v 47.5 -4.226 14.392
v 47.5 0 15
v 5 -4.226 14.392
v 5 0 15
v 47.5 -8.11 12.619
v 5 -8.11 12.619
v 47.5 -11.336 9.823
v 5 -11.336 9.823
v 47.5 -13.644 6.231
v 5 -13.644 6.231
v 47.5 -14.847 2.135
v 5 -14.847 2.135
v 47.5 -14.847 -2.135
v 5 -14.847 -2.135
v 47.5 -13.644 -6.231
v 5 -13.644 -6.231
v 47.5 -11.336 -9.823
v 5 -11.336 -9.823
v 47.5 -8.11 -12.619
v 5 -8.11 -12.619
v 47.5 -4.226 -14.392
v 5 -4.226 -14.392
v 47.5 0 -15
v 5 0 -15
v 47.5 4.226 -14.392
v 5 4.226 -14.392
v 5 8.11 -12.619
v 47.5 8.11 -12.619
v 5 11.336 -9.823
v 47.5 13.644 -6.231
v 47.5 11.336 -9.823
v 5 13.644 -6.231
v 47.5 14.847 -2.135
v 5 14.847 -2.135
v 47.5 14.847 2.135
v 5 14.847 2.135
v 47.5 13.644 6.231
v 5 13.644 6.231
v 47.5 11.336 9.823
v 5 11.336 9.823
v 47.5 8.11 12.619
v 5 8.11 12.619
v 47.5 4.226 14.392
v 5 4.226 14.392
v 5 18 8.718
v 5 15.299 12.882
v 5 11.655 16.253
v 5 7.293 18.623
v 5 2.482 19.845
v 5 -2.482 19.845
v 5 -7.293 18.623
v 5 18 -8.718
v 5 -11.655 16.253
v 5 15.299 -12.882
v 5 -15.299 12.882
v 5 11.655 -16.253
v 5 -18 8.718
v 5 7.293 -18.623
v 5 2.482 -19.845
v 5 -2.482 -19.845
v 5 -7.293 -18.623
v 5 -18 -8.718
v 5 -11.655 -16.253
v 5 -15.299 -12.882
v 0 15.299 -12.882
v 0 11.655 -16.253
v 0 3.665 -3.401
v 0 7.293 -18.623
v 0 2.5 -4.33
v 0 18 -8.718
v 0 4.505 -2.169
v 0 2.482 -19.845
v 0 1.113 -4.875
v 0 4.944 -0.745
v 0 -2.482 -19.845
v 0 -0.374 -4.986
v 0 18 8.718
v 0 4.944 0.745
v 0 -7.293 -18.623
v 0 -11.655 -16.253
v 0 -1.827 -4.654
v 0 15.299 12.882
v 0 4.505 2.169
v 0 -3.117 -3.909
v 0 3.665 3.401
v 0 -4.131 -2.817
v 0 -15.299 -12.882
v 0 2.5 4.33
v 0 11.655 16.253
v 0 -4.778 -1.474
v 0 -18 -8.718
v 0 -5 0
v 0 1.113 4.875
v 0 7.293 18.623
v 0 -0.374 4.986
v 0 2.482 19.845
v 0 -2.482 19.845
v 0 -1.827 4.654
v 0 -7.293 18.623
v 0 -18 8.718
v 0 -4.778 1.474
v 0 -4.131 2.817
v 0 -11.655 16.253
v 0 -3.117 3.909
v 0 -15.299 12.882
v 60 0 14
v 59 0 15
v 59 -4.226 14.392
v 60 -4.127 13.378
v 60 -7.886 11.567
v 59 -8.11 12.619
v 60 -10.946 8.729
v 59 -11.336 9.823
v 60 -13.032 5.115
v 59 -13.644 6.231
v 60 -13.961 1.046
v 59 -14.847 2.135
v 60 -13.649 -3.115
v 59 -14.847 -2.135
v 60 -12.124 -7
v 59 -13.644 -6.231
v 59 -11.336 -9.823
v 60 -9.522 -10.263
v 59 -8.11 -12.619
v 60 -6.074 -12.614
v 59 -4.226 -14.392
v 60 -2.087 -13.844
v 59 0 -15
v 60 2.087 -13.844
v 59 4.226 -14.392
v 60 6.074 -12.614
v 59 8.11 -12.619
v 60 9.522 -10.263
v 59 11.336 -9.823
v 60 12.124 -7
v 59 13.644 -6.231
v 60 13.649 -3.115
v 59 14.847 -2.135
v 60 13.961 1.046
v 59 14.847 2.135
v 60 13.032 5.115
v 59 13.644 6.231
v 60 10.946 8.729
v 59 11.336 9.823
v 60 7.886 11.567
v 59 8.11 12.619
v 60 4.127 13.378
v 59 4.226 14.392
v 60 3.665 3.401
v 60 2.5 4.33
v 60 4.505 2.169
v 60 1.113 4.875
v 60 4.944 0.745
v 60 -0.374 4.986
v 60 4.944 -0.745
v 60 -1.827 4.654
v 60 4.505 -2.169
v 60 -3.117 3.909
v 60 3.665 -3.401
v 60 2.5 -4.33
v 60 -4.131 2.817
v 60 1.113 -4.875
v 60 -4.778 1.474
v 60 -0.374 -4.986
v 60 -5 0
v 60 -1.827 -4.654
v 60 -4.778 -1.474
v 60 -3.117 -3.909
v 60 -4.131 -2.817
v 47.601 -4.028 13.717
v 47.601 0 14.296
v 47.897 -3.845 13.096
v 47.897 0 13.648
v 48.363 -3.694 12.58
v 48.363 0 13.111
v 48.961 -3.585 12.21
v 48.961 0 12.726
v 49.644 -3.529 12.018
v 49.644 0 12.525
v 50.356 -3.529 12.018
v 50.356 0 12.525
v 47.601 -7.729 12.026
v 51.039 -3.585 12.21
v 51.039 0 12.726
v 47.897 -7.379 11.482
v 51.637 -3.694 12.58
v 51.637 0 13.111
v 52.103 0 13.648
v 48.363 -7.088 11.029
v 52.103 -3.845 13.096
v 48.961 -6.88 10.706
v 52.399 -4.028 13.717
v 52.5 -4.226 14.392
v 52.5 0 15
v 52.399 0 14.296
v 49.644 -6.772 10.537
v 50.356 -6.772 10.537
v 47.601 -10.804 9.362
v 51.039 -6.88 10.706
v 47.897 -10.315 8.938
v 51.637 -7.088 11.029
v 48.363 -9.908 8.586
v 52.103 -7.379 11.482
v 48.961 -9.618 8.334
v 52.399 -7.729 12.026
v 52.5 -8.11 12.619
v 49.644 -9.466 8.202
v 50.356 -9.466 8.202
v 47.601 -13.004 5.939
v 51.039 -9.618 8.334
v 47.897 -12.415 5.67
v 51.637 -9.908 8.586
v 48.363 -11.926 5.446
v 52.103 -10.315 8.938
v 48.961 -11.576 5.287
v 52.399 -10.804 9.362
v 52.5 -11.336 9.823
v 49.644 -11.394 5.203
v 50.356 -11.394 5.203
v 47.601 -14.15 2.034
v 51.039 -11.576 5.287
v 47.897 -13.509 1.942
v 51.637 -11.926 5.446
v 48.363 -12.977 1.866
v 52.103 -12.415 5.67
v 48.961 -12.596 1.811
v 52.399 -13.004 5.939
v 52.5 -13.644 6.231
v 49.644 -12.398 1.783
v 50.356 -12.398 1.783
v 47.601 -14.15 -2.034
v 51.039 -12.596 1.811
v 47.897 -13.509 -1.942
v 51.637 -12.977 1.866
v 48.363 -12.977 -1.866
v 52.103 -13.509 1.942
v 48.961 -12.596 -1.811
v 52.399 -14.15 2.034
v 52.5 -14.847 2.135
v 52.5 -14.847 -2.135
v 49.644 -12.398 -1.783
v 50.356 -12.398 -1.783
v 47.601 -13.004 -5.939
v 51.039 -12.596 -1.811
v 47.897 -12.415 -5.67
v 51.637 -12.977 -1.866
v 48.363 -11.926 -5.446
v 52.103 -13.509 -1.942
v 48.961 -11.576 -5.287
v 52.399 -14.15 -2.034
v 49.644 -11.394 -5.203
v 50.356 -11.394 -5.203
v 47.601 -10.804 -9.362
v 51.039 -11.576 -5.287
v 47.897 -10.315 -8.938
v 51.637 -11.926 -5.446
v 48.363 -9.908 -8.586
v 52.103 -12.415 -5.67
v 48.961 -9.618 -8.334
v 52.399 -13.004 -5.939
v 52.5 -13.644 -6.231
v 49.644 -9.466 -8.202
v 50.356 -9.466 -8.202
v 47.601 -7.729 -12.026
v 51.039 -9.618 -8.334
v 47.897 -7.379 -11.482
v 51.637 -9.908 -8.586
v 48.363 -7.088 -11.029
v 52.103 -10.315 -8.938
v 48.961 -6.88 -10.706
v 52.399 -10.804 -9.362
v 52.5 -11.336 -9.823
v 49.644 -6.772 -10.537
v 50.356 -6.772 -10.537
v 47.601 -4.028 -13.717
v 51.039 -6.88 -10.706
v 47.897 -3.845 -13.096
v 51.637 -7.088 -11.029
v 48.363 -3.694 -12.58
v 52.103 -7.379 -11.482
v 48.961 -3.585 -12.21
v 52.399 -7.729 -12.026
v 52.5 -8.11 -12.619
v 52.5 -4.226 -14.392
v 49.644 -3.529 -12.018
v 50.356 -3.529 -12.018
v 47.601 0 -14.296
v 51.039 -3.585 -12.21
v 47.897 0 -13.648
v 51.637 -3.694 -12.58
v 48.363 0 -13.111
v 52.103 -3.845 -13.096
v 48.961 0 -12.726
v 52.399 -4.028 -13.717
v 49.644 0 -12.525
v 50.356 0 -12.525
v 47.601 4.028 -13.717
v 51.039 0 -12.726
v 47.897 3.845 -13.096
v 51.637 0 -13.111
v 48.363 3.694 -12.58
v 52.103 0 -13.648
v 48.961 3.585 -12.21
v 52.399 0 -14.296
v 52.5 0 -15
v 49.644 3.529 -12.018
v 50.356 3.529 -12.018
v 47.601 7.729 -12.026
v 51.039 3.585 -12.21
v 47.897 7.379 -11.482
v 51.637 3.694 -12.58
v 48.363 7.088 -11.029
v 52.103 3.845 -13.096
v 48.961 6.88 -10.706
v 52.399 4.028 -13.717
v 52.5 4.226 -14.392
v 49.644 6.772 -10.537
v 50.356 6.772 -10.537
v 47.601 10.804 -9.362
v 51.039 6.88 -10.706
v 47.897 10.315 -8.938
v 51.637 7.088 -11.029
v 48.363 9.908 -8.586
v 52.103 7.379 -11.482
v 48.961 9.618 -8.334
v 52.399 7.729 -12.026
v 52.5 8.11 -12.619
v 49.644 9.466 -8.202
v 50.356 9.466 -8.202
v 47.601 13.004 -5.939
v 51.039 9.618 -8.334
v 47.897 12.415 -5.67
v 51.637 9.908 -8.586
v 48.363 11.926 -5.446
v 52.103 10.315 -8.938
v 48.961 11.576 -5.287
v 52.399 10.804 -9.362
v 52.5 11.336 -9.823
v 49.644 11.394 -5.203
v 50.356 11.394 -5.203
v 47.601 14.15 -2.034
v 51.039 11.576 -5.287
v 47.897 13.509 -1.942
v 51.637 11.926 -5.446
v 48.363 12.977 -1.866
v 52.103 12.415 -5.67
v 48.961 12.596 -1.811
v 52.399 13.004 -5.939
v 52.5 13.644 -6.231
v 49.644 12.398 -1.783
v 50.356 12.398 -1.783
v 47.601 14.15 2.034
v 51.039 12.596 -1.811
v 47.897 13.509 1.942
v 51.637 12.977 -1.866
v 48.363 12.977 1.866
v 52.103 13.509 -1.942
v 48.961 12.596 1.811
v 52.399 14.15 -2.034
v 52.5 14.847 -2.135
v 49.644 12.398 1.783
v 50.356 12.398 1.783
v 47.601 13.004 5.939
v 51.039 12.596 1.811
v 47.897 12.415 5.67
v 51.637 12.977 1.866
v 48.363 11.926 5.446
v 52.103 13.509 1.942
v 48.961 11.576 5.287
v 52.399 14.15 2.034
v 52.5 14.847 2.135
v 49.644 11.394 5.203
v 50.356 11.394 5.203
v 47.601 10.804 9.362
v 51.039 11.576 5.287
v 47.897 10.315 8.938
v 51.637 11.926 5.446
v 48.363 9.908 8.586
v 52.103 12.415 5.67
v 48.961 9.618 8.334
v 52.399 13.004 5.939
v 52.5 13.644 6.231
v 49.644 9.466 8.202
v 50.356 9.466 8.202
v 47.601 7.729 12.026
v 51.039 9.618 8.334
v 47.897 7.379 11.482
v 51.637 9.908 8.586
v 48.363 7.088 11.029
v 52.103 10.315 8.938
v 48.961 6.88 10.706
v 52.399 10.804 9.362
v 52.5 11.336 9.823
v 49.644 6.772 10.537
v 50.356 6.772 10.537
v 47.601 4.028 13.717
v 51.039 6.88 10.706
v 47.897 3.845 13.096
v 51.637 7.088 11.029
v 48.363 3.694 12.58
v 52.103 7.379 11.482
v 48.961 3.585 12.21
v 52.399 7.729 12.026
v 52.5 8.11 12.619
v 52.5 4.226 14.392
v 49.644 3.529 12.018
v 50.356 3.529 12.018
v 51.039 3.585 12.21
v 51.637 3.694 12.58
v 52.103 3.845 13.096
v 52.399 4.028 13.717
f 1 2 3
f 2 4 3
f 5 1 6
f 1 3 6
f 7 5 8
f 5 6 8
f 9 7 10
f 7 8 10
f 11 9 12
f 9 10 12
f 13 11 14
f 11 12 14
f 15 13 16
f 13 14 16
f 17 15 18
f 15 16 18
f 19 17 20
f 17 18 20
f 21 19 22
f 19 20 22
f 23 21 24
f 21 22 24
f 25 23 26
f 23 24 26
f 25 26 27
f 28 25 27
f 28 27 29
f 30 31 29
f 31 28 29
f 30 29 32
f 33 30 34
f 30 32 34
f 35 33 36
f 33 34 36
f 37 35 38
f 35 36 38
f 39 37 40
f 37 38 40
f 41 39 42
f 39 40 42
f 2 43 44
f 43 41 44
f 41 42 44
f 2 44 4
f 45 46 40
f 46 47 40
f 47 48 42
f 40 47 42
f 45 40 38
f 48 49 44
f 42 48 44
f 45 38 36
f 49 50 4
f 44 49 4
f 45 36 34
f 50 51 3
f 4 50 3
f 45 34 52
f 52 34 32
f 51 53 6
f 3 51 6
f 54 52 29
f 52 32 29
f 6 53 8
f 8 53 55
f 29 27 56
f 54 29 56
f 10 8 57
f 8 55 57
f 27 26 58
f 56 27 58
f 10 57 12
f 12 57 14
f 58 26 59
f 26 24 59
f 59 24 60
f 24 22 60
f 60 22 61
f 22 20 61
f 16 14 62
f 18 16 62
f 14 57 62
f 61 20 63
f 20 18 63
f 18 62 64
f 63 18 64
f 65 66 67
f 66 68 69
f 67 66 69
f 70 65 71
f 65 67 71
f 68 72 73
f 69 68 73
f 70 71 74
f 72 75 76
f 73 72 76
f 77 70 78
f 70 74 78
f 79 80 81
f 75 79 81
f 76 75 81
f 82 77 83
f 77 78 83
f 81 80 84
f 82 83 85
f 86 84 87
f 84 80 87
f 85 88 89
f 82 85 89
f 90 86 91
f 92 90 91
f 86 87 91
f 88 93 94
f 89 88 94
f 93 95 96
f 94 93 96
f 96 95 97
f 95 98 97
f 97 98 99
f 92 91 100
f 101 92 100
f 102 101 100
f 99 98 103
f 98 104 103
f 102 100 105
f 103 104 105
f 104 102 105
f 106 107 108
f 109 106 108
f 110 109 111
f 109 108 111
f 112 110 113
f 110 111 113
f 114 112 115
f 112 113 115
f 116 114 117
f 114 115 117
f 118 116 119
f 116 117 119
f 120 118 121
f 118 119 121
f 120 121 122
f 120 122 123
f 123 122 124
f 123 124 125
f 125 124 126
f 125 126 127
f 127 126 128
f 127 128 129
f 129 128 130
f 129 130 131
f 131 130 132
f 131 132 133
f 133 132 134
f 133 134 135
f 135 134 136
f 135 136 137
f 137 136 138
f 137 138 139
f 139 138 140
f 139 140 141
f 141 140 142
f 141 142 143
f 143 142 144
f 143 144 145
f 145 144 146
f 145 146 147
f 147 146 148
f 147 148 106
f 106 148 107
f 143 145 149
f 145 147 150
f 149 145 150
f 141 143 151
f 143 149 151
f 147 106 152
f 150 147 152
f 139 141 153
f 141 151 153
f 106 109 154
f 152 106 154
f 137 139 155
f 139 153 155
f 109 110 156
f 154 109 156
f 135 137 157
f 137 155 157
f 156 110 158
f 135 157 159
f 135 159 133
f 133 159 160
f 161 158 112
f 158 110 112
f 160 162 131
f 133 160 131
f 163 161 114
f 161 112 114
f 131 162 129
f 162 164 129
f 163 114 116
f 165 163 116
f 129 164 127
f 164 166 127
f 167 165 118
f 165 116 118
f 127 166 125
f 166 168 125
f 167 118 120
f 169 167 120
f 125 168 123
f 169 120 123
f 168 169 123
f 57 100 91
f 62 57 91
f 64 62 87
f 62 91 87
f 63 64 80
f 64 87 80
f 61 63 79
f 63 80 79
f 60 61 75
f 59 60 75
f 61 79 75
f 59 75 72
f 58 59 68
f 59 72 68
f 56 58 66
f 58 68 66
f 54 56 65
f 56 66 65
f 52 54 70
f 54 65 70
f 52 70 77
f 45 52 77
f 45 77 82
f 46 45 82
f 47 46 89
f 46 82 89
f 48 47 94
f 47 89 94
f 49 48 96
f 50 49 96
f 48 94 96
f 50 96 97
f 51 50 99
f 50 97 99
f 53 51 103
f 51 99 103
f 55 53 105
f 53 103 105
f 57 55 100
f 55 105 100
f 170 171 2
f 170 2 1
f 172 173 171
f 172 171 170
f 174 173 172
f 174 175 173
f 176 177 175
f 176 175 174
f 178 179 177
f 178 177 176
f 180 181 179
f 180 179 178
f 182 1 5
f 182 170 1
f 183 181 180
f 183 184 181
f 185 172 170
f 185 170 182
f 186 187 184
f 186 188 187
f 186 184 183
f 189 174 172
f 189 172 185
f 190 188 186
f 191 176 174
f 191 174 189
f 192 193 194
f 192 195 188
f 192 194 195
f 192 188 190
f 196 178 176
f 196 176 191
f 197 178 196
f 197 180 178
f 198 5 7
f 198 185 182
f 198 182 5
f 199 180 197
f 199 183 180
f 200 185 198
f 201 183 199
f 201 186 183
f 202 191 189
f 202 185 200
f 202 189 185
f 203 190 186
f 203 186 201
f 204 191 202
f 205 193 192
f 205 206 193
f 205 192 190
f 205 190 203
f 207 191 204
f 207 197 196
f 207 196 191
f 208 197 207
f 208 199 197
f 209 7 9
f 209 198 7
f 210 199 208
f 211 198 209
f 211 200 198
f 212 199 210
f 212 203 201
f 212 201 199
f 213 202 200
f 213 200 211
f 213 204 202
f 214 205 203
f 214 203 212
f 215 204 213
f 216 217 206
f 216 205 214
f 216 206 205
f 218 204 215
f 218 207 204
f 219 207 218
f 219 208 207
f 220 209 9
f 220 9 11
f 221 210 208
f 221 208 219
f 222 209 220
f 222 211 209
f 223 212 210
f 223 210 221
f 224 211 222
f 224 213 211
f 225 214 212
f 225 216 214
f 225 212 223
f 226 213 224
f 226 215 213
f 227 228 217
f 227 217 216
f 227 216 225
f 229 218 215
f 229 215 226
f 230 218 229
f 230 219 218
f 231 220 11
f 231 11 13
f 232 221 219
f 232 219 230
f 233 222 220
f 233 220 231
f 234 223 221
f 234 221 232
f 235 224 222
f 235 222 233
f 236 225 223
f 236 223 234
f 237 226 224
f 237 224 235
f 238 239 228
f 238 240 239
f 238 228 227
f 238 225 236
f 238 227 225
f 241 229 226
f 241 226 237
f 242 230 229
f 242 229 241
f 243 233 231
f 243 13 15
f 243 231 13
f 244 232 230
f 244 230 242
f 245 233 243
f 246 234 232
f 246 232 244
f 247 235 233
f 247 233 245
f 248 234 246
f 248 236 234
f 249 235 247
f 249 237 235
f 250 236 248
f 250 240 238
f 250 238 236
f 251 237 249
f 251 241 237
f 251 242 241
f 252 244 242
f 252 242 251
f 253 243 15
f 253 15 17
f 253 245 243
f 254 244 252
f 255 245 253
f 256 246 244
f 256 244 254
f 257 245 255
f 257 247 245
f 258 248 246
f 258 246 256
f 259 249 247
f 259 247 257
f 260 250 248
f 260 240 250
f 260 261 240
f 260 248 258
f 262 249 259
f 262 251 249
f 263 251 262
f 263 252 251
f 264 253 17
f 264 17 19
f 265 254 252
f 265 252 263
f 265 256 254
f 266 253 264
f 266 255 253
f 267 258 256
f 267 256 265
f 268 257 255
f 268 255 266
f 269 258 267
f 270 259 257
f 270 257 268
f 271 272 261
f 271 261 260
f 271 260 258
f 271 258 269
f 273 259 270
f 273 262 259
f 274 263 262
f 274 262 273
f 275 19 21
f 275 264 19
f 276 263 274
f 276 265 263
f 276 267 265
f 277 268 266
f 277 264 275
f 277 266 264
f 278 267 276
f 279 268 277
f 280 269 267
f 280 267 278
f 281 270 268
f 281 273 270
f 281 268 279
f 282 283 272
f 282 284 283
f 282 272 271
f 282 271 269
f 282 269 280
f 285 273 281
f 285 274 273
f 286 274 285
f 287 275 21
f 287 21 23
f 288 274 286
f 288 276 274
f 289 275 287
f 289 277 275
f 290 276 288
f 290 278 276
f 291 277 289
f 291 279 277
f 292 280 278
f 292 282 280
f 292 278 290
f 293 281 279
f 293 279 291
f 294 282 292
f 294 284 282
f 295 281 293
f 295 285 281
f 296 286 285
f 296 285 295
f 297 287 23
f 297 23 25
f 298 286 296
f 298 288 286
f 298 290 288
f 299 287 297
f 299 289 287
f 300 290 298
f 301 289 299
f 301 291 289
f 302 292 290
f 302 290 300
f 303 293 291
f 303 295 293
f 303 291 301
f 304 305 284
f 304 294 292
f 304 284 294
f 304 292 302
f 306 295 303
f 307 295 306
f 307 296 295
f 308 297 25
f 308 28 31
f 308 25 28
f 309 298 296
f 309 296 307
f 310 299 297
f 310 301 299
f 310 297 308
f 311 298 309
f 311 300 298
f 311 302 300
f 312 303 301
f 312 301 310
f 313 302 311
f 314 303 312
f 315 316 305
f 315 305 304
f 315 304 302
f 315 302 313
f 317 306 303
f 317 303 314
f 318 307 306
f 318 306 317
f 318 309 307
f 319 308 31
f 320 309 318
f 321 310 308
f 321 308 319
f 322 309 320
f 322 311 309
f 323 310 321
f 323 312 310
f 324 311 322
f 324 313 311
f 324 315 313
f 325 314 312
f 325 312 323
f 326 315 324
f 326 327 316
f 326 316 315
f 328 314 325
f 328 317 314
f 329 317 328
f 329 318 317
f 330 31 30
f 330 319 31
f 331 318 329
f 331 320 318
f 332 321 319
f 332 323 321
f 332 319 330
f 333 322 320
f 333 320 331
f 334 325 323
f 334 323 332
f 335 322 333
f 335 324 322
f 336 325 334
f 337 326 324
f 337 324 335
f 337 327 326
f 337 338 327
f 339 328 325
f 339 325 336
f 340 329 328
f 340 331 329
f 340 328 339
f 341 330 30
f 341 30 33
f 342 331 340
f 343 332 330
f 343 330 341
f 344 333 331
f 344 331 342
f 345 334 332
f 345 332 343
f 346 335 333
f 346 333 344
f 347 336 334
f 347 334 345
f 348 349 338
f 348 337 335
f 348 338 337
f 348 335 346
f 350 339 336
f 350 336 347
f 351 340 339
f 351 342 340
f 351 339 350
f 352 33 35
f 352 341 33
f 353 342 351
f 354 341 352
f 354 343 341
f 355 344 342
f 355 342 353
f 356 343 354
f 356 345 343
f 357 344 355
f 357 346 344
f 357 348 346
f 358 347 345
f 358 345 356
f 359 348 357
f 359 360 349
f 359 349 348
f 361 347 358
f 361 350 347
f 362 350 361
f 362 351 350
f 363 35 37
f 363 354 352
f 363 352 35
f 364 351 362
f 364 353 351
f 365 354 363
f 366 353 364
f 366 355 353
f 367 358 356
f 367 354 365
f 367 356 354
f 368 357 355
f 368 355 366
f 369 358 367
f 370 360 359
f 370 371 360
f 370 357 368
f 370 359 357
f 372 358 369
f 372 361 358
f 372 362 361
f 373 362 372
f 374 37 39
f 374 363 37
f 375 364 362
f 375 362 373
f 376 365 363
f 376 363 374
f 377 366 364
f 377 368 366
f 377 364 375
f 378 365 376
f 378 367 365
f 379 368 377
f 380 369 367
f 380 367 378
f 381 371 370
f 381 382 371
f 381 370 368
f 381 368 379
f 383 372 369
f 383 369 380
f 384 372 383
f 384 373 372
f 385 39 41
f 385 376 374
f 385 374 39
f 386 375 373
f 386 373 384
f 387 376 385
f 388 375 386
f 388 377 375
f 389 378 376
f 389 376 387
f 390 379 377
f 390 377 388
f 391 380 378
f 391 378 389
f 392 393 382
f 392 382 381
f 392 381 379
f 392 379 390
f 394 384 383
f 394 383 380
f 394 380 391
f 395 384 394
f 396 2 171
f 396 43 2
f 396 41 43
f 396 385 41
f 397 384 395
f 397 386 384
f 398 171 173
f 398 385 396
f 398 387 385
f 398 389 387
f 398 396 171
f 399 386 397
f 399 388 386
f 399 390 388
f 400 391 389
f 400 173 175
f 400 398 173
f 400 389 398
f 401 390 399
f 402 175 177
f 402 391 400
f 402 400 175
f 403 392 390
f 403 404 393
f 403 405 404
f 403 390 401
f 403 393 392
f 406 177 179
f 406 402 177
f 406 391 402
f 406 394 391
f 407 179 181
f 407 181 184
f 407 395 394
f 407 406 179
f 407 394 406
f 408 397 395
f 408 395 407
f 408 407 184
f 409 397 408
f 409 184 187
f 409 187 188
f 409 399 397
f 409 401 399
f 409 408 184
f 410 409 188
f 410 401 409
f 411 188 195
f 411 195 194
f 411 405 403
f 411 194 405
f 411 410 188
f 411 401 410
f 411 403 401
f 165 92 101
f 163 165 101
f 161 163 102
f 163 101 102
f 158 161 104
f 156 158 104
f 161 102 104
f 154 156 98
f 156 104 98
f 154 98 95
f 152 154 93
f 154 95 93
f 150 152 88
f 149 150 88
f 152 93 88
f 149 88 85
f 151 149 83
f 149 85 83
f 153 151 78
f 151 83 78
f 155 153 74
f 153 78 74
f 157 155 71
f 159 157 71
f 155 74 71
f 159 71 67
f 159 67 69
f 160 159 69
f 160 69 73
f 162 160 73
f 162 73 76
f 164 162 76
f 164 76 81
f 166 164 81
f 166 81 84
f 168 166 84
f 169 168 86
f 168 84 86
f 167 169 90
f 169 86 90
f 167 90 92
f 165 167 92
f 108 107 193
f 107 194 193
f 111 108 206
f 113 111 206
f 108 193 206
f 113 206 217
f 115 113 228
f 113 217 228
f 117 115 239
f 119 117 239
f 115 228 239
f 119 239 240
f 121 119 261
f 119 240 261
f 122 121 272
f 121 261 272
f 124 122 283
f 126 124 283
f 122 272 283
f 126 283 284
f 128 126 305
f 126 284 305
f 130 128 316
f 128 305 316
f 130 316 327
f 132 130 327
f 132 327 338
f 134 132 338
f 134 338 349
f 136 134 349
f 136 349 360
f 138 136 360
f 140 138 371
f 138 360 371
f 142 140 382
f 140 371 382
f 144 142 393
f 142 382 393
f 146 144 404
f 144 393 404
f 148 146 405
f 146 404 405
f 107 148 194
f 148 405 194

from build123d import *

# Parameters (mm, degrees)
F3_SIZE  = 1
F1_R     = 2.5
F6_DEPTH = 5
F7_R     = 5
F8_DEPTH = 60


with BuildPart() as f2:
    # F0 (on Front) → F2 (revolve)
    with BuildSketch(Plane.XZ):
        Polygon((0, 20), (0, 0), (60, 0), (60, 15), (5, 15), (5, 20), align=None)
    revolve(axis=Axis((30, 0, 0), (1, 0, 0)))

    # F3
    f3_edges = [f2.edges().sort_by_distance(p)[0] for p in [
        (60, 0, -15),
    ]]
    chamfer(f3_edges, length=F3_SIZE)

    # F1 (on face) → F4 (revolve, cut)
    with BuildSketch(Plane.XZ):
        with Locations((50, 15)):
            Circle(F1_R)
    revolve(axis=Axis((30, 0, 0), (1, 0, 0)), mode=Mode.SUBTRACT)

    # F5 (on face) → F6 (cut, through all)
    with BuildSketch(Plane(origin=(0, 0, 0), x_dir=(0, -1, 0), z_dir=(-1, 0, 0))):
        with BuildLine():
            Line((18, 8.7177978871), (18, -8.7177978871))
            ThreePointArc((18, -8.7177978871), (19.4935886896, -4.472135955), (20, 0))
            ThreePointArc((20, 0), (19.4935886896, 4.472135955), (18, 8.7177978871))
        make_face()
        with BuildLine():
            ThreePointArc((-18, 8.7177978871), (-20, 0), (-18, -8.7177978871))
            Line((-18, -8.7177978871), (-18, 8.7177978871))
        make_face()
    extrude(amount=-F6_DEPTH, mode=Mode.SUBTRACT)

    # F7 (on face) → F8 (cut, through all)
    with BuildSketch(Plane(origin=(0, 0, 0), x_dir=(0, -1, 0), z_dir=(-1, 0, 0))):
        Circle(F7_R)
    extrude(amount=-F8_DEPTH, mode=Mode.SUBTRACT)


solid = f2.part
